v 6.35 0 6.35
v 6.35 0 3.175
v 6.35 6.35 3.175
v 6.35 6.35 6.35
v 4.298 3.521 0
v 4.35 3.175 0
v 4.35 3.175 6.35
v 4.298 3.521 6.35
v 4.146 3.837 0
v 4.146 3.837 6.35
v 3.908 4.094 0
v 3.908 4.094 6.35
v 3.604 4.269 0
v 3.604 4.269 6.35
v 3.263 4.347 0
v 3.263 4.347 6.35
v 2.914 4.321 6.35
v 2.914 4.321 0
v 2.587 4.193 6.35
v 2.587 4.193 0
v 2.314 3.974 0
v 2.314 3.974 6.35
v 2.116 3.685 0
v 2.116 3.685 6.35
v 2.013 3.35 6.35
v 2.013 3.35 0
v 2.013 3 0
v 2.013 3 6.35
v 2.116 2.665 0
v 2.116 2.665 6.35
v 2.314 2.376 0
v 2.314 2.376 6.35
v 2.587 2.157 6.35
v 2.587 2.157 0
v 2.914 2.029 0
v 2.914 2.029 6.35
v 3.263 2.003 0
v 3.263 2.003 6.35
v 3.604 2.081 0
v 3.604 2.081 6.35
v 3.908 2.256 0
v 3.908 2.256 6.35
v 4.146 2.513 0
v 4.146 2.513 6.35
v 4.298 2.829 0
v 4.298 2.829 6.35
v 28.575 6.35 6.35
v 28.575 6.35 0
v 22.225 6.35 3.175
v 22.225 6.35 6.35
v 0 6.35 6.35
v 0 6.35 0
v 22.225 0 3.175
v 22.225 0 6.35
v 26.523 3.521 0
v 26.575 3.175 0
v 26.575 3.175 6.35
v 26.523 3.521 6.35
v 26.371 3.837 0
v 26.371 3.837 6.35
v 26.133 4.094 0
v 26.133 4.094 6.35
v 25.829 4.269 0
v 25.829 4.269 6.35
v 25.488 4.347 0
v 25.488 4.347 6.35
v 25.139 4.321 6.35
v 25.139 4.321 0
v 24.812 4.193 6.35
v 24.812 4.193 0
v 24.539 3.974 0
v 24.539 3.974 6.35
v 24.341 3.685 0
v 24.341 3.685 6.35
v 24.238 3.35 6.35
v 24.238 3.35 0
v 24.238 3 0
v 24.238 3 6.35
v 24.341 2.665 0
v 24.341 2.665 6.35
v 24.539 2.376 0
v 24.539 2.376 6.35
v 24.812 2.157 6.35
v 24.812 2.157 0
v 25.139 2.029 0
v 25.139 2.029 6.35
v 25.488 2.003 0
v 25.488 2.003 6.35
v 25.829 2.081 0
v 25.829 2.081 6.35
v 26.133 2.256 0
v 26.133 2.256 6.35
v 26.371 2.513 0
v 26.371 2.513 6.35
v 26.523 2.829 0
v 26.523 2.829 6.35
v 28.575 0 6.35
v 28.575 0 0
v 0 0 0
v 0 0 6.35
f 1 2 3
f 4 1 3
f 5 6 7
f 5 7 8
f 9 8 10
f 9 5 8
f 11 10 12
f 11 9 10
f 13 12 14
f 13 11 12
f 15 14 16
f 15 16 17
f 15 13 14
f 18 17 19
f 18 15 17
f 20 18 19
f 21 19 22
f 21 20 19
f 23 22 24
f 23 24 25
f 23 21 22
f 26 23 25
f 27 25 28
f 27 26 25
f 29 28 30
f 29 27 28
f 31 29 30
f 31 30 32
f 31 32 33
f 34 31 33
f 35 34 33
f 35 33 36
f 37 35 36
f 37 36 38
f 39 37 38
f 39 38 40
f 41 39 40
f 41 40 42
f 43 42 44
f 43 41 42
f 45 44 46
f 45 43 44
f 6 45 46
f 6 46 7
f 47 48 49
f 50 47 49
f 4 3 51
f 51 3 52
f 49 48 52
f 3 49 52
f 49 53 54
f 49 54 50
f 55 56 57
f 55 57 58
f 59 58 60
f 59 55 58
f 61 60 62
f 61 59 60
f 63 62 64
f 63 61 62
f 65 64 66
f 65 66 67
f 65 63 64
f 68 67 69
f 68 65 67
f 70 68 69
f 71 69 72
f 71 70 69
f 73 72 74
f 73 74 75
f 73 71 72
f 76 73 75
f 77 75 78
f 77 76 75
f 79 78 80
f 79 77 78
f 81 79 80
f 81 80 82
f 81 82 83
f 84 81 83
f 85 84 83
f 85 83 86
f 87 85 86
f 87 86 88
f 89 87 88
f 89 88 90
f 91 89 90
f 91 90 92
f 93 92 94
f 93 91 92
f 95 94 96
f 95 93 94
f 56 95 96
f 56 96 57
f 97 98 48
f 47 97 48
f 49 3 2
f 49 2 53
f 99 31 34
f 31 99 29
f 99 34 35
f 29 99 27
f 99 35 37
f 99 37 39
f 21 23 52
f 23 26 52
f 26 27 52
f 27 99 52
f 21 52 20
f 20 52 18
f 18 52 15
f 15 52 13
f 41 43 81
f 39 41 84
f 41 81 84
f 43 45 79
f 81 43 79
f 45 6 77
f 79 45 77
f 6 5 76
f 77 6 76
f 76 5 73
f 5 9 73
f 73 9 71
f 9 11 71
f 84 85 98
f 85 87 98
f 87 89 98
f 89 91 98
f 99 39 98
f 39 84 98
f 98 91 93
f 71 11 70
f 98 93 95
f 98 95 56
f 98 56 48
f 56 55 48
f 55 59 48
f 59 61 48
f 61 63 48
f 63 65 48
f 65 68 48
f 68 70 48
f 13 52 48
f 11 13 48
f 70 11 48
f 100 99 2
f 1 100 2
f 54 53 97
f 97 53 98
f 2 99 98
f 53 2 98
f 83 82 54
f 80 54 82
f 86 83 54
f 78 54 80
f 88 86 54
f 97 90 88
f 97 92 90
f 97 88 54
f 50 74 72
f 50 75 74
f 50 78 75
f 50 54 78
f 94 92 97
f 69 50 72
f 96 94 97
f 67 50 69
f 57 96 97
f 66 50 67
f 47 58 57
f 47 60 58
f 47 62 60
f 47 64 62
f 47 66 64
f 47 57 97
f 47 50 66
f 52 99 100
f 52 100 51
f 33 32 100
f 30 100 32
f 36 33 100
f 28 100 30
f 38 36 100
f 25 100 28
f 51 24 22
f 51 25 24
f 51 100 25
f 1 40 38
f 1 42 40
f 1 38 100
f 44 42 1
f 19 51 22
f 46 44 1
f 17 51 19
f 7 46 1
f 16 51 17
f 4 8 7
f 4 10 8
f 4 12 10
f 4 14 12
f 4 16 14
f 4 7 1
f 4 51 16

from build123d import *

# Parameters (mm, degrees)
F0_W     = 6.35
F0_H     = 6.35
F0_R     = 1.1751262937
F1_DEPTH = 6.35
F0_W_2   = 7.9375
F2_DEPTH = 3.175


with BuildPart() as f1:
    # F0 (on Top) → F1 (new body)
    with BuildSketch(Plane.XY):
        with Locations((3.175, 3.175)):
            Rectangle(F0_W, F0_H)
        with Locations((3.175, 3.175)):
            Circle(F0_R, mode=Mode.SUBTRACT)
    extrude(amount=F1_DEPTH)



with BuildPart() as f1b:
    # F0 (on Top) → F1, piece 2 (new body)
    with BuildSketch(Plane.XY):
        with Locations((25.4, 3.175)):
            Rectangle(F0_W, F0_H)
        with Locations((25.4, 3.175)):
            Circle(F0_R, mode=Mode.SUBTRACT)
    extrude(amount=F1_DEPTH)


with BuildPart() as f1_1:
    add(f1.part)

    add(f1b.part)  # F2 merges F1b
    # F0 (on Top) → F2 (join)
    with BuildSketch(Plane.XY):
        with Locations((10.31875, 3.175)):
            Rectangle(F0_W_2, F0_H)
        with Locations((18.25625, 3.175)):
            Rectangle(F0_W_2, F0_H)
    extrude(amount=F2_DEPTH)


solid = f1_1.part
